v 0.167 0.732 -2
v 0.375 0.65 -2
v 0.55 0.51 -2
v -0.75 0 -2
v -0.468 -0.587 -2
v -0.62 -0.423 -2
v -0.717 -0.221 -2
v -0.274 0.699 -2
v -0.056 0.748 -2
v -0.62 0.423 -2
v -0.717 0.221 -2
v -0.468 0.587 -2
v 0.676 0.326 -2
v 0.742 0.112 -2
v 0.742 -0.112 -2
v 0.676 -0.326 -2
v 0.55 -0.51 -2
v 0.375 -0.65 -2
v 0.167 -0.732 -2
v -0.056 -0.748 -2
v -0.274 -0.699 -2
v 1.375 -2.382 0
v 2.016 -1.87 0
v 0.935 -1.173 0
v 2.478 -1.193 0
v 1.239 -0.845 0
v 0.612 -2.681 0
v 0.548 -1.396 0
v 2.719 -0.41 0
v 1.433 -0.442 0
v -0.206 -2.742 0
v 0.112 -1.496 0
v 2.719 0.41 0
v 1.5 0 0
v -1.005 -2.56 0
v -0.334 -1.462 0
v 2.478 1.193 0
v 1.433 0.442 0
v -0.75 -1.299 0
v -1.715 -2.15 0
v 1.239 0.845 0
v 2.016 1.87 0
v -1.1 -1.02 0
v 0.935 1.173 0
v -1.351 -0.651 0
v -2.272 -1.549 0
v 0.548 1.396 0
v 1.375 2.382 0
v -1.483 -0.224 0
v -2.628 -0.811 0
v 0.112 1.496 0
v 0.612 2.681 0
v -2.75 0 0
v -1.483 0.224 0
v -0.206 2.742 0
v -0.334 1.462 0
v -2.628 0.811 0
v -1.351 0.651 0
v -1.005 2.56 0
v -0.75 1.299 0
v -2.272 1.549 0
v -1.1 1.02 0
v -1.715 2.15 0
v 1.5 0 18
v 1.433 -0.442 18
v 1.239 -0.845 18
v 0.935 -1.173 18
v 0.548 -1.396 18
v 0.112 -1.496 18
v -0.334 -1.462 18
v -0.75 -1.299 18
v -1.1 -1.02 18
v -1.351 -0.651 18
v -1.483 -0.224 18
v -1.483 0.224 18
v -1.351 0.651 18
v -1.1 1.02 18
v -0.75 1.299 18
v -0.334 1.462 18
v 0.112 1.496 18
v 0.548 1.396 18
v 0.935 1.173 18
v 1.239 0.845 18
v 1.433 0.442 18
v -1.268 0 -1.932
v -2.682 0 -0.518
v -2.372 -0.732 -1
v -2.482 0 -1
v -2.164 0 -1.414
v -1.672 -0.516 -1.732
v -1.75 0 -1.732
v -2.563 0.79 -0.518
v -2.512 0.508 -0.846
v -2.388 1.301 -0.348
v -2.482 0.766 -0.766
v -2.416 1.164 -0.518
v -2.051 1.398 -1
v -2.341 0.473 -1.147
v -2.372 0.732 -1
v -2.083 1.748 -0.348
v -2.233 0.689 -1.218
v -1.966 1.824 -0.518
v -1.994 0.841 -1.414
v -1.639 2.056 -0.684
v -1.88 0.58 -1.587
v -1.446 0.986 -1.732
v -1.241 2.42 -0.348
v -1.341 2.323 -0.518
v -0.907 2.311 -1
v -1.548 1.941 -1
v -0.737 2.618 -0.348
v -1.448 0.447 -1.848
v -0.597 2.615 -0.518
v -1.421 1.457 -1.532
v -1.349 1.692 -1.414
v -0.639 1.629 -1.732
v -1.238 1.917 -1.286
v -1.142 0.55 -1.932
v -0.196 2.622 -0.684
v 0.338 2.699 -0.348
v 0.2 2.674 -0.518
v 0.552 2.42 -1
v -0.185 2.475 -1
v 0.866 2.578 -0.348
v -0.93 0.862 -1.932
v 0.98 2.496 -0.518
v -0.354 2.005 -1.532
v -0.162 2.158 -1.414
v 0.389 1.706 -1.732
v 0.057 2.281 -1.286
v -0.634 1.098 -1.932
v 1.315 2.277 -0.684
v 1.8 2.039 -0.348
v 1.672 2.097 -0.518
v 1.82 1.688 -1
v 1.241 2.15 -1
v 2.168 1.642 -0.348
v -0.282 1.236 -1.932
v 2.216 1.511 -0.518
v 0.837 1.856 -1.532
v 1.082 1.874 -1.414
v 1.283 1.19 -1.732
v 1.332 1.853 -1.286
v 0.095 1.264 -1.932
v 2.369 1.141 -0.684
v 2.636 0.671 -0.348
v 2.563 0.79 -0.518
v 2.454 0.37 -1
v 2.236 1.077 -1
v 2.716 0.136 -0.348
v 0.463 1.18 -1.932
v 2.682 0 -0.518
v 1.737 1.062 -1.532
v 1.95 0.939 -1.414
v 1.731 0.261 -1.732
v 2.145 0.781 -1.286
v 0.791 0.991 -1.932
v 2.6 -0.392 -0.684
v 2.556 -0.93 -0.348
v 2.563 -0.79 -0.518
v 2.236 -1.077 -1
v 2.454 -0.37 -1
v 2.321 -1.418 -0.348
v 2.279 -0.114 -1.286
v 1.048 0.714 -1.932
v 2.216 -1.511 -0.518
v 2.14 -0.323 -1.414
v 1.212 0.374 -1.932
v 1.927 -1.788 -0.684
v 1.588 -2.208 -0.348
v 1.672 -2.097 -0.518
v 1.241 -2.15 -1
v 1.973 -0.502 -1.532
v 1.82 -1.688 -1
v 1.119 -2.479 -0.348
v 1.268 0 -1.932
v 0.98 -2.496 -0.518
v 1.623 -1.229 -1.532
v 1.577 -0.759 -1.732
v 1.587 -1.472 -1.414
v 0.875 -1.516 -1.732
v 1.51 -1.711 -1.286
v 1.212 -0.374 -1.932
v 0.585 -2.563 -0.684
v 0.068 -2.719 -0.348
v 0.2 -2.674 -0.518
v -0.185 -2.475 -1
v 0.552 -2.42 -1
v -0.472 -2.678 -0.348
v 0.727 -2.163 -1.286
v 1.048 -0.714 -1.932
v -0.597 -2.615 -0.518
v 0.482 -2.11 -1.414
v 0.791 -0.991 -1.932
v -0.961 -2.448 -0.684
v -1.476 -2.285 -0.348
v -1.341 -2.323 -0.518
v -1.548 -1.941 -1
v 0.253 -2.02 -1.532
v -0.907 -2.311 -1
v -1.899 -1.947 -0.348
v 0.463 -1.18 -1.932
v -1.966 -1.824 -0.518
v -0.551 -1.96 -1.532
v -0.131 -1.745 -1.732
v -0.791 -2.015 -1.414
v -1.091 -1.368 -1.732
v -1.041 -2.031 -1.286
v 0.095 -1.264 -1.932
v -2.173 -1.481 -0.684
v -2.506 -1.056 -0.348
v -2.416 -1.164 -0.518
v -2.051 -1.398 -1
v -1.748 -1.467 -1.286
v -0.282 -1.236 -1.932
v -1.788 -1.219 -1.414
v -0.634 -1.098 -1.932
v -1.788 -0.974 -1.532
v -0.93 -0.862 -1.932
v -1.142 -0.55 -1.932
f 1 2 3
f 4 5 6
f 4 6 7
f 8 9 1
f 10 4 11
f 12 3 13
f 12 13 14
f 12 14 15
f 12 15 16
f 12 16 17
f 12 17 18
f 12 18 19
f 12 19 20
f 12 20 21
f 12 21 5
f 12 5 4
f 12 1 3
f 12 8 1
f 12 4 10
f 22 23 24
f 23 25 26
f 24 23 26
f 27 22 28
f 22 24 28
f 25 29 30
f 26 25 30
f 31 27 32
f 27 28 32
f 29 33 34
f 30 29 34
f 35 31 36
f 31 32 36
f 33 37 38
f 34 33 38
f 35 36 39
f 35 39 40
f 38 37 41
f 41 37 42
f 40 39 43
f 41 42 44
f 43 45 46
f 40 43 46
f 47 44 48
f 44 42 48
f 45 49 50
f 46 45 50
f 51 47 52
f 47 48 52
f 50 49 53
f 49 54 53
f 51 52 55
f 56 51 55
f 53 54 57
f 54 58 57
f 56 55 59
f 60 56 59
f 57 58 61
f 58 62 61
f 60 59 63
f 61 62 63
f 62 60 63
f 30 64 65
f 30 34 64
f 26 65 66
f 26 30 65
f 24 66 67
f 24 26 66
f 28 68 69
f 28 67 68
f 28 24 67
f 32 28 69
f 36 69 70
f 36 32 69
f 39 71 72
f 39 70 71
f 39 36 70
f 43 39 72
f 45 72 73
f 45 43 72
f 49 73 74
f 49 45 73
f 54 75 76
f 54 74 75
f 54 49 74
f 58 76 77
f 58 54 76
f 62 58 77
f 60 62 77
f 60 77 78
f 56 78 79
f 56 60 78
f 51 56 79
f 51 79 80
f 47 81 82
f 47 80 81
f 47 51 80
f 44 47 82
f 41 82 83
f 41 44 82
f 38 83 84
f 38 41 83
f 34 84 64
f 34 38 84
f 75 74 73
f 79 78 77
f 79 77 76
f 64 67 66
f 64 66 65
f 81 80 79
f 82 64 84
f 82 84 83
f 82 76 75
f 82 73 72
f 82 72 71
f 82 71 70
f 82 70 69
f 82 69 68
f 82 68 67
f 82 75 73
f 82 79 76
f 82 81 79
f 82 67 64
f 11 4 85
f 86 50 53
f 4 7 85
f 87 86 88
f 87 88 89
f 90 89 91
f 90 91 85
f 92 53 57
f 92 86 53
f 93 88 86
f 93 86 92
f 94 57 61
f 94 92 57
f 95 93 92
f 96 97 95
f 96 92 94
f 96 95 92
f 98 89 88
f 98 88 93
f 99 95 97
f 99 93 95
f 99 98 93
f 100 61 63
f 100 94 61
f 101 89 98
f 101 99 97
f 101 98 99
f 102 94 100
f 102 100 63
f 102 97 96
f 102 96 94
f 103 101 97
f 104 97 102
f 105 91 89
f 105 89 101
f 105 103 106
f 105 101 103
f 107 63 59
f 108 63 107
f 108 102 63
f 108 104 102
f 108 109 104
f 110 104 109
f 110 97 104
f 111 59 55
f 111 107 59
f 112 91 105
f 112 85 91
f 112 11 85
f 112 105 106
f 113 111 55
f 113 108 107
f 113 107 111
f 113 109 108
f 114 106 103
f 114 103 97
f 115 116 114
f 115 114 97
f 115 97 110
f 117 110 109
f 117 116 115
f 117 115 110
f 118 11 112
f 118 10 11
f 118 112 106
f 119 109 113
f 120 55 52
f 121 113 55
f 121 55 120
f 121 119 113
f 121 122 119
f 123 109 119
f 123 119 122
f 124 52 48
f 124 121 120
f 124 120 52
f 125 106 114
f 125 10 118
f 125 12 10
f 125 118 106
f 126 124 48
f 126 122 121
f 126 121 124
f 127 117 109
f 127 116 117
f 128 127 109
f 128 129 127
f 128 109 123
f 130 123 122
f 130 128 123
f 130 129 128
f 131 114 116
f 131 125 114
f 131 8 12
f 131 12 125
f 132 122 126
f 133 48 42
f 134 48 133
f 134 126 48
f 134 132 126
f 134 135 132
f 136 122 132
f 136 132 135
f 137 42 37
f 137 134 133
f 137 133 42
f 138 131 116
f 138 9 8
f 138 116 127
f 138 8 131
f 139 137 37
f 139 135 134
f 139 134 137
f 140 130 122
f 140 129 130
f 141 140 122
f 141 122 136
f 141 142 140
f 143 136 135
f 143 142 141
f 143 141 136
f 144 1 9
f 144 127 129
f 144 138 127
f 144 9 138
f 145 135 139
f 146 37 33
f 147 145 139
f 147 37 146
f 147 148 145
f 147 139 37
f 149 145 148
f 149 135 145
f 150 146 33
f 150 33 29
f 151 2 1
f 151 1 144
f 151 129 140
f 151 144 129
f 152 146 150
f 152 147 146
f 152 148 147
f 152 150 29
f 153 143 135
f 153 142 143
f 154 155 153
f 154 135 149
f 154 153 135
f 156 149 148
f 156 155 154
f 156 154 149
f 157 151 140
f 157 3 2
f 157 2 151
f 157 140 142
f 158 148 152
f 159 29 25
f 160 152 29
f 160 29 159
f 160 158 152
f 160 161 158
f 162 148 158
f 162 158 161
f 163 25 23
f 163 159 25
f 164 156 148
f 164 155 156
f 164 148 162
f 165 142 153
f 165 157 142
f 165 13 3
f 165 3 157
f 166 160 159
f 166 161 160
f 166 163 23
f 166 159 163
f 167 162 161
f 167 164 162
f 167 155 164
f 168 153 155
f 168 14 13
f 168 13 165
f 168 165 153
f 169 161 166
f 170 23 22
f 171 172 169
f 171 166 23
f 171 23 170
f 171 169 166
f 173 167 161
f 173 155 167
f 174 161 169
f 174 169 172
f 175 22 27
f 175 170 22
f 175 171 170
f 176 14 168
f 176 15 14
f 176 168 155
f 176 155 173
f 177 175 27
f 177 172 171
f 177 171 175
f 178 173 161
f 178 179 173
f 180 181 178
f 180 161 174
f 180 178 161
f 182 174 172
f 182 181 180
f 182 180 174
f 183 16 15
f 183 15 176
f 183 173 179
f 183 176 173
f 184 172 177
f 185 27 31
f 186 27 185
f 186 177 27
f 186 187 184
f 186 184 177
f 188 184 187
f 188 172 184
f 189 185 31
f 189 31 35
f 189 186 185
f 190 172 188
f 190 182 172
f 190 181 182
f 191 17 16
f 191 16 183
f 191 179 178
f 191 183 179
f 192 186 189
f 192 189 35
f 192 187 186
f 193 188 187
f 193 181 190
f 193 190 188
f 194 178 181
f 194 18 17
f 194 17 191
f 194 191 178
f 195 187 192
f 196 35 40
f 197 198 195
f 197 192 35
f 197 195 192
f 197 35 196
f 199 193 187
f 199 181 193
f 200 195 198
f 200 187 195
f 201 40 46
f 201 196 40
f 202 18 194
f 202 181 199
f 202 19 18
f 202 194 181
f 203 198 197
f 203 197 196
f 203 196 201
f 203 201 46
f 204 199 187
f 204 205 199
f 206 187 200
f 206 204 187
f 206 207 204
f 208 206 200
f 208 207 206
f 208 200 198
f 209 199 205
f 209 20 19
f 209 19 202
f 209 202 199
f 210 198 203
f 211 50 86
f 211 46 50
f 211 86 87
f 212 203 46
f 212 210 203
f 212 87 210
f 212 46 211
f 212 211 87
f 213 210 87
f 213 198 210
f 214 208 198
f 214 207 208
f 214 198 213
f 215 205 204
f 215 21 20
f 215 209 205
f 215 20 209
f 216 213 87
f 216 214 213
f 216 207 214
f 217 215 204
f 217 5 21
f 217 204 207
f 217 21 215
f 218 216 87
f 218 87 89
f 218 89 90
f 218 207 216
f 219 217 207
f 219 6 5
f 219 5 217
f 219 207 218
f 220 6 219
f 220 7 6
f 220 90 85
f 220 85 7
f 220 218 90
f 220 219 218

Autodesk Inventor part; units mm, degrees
ref_plane "YZ Plane" through (0, 0, 0) normal (1, 0, 0) x (0, 1, 0)
ref_plane "XZ Plane" through (0, 0, 0) normal (0, 1, 0) x (-1, 0, 0)
ref_plane "XY Plane" through (0, 0, 0) normal (0, 0, 1) x (1, 0, 0)
sketch "スケッチ1" plane through (0, 0, 0) normal (0, 0, 1) x (1, 0, 0)
  circle A0 centre (0, 0) radius 1.5
  dimension "d0" = 3
extrude "押し出し1" add sketch "スケッチ1" along normal blind 18
sketch "スケッチ2" plane through (0, 0, 0) normal (0, 0, -1) x (-1, 0, 0)
  circle A0 centre (0, 0) radius 2.75
  dimension "d3" = 5.5
extrude "押し出し2" add sketch "スケッチ2" along normal blind 2
fillet "フィレット1" radius 2 1 edges at (2.75, 0, -2)
thread "ねじ1" size "M3x0.5" class "6g" standard "ANSI Metric M Profile" full length
properties part number "ネジ鍋m3,18" material "鋼、高強度、低合金"
